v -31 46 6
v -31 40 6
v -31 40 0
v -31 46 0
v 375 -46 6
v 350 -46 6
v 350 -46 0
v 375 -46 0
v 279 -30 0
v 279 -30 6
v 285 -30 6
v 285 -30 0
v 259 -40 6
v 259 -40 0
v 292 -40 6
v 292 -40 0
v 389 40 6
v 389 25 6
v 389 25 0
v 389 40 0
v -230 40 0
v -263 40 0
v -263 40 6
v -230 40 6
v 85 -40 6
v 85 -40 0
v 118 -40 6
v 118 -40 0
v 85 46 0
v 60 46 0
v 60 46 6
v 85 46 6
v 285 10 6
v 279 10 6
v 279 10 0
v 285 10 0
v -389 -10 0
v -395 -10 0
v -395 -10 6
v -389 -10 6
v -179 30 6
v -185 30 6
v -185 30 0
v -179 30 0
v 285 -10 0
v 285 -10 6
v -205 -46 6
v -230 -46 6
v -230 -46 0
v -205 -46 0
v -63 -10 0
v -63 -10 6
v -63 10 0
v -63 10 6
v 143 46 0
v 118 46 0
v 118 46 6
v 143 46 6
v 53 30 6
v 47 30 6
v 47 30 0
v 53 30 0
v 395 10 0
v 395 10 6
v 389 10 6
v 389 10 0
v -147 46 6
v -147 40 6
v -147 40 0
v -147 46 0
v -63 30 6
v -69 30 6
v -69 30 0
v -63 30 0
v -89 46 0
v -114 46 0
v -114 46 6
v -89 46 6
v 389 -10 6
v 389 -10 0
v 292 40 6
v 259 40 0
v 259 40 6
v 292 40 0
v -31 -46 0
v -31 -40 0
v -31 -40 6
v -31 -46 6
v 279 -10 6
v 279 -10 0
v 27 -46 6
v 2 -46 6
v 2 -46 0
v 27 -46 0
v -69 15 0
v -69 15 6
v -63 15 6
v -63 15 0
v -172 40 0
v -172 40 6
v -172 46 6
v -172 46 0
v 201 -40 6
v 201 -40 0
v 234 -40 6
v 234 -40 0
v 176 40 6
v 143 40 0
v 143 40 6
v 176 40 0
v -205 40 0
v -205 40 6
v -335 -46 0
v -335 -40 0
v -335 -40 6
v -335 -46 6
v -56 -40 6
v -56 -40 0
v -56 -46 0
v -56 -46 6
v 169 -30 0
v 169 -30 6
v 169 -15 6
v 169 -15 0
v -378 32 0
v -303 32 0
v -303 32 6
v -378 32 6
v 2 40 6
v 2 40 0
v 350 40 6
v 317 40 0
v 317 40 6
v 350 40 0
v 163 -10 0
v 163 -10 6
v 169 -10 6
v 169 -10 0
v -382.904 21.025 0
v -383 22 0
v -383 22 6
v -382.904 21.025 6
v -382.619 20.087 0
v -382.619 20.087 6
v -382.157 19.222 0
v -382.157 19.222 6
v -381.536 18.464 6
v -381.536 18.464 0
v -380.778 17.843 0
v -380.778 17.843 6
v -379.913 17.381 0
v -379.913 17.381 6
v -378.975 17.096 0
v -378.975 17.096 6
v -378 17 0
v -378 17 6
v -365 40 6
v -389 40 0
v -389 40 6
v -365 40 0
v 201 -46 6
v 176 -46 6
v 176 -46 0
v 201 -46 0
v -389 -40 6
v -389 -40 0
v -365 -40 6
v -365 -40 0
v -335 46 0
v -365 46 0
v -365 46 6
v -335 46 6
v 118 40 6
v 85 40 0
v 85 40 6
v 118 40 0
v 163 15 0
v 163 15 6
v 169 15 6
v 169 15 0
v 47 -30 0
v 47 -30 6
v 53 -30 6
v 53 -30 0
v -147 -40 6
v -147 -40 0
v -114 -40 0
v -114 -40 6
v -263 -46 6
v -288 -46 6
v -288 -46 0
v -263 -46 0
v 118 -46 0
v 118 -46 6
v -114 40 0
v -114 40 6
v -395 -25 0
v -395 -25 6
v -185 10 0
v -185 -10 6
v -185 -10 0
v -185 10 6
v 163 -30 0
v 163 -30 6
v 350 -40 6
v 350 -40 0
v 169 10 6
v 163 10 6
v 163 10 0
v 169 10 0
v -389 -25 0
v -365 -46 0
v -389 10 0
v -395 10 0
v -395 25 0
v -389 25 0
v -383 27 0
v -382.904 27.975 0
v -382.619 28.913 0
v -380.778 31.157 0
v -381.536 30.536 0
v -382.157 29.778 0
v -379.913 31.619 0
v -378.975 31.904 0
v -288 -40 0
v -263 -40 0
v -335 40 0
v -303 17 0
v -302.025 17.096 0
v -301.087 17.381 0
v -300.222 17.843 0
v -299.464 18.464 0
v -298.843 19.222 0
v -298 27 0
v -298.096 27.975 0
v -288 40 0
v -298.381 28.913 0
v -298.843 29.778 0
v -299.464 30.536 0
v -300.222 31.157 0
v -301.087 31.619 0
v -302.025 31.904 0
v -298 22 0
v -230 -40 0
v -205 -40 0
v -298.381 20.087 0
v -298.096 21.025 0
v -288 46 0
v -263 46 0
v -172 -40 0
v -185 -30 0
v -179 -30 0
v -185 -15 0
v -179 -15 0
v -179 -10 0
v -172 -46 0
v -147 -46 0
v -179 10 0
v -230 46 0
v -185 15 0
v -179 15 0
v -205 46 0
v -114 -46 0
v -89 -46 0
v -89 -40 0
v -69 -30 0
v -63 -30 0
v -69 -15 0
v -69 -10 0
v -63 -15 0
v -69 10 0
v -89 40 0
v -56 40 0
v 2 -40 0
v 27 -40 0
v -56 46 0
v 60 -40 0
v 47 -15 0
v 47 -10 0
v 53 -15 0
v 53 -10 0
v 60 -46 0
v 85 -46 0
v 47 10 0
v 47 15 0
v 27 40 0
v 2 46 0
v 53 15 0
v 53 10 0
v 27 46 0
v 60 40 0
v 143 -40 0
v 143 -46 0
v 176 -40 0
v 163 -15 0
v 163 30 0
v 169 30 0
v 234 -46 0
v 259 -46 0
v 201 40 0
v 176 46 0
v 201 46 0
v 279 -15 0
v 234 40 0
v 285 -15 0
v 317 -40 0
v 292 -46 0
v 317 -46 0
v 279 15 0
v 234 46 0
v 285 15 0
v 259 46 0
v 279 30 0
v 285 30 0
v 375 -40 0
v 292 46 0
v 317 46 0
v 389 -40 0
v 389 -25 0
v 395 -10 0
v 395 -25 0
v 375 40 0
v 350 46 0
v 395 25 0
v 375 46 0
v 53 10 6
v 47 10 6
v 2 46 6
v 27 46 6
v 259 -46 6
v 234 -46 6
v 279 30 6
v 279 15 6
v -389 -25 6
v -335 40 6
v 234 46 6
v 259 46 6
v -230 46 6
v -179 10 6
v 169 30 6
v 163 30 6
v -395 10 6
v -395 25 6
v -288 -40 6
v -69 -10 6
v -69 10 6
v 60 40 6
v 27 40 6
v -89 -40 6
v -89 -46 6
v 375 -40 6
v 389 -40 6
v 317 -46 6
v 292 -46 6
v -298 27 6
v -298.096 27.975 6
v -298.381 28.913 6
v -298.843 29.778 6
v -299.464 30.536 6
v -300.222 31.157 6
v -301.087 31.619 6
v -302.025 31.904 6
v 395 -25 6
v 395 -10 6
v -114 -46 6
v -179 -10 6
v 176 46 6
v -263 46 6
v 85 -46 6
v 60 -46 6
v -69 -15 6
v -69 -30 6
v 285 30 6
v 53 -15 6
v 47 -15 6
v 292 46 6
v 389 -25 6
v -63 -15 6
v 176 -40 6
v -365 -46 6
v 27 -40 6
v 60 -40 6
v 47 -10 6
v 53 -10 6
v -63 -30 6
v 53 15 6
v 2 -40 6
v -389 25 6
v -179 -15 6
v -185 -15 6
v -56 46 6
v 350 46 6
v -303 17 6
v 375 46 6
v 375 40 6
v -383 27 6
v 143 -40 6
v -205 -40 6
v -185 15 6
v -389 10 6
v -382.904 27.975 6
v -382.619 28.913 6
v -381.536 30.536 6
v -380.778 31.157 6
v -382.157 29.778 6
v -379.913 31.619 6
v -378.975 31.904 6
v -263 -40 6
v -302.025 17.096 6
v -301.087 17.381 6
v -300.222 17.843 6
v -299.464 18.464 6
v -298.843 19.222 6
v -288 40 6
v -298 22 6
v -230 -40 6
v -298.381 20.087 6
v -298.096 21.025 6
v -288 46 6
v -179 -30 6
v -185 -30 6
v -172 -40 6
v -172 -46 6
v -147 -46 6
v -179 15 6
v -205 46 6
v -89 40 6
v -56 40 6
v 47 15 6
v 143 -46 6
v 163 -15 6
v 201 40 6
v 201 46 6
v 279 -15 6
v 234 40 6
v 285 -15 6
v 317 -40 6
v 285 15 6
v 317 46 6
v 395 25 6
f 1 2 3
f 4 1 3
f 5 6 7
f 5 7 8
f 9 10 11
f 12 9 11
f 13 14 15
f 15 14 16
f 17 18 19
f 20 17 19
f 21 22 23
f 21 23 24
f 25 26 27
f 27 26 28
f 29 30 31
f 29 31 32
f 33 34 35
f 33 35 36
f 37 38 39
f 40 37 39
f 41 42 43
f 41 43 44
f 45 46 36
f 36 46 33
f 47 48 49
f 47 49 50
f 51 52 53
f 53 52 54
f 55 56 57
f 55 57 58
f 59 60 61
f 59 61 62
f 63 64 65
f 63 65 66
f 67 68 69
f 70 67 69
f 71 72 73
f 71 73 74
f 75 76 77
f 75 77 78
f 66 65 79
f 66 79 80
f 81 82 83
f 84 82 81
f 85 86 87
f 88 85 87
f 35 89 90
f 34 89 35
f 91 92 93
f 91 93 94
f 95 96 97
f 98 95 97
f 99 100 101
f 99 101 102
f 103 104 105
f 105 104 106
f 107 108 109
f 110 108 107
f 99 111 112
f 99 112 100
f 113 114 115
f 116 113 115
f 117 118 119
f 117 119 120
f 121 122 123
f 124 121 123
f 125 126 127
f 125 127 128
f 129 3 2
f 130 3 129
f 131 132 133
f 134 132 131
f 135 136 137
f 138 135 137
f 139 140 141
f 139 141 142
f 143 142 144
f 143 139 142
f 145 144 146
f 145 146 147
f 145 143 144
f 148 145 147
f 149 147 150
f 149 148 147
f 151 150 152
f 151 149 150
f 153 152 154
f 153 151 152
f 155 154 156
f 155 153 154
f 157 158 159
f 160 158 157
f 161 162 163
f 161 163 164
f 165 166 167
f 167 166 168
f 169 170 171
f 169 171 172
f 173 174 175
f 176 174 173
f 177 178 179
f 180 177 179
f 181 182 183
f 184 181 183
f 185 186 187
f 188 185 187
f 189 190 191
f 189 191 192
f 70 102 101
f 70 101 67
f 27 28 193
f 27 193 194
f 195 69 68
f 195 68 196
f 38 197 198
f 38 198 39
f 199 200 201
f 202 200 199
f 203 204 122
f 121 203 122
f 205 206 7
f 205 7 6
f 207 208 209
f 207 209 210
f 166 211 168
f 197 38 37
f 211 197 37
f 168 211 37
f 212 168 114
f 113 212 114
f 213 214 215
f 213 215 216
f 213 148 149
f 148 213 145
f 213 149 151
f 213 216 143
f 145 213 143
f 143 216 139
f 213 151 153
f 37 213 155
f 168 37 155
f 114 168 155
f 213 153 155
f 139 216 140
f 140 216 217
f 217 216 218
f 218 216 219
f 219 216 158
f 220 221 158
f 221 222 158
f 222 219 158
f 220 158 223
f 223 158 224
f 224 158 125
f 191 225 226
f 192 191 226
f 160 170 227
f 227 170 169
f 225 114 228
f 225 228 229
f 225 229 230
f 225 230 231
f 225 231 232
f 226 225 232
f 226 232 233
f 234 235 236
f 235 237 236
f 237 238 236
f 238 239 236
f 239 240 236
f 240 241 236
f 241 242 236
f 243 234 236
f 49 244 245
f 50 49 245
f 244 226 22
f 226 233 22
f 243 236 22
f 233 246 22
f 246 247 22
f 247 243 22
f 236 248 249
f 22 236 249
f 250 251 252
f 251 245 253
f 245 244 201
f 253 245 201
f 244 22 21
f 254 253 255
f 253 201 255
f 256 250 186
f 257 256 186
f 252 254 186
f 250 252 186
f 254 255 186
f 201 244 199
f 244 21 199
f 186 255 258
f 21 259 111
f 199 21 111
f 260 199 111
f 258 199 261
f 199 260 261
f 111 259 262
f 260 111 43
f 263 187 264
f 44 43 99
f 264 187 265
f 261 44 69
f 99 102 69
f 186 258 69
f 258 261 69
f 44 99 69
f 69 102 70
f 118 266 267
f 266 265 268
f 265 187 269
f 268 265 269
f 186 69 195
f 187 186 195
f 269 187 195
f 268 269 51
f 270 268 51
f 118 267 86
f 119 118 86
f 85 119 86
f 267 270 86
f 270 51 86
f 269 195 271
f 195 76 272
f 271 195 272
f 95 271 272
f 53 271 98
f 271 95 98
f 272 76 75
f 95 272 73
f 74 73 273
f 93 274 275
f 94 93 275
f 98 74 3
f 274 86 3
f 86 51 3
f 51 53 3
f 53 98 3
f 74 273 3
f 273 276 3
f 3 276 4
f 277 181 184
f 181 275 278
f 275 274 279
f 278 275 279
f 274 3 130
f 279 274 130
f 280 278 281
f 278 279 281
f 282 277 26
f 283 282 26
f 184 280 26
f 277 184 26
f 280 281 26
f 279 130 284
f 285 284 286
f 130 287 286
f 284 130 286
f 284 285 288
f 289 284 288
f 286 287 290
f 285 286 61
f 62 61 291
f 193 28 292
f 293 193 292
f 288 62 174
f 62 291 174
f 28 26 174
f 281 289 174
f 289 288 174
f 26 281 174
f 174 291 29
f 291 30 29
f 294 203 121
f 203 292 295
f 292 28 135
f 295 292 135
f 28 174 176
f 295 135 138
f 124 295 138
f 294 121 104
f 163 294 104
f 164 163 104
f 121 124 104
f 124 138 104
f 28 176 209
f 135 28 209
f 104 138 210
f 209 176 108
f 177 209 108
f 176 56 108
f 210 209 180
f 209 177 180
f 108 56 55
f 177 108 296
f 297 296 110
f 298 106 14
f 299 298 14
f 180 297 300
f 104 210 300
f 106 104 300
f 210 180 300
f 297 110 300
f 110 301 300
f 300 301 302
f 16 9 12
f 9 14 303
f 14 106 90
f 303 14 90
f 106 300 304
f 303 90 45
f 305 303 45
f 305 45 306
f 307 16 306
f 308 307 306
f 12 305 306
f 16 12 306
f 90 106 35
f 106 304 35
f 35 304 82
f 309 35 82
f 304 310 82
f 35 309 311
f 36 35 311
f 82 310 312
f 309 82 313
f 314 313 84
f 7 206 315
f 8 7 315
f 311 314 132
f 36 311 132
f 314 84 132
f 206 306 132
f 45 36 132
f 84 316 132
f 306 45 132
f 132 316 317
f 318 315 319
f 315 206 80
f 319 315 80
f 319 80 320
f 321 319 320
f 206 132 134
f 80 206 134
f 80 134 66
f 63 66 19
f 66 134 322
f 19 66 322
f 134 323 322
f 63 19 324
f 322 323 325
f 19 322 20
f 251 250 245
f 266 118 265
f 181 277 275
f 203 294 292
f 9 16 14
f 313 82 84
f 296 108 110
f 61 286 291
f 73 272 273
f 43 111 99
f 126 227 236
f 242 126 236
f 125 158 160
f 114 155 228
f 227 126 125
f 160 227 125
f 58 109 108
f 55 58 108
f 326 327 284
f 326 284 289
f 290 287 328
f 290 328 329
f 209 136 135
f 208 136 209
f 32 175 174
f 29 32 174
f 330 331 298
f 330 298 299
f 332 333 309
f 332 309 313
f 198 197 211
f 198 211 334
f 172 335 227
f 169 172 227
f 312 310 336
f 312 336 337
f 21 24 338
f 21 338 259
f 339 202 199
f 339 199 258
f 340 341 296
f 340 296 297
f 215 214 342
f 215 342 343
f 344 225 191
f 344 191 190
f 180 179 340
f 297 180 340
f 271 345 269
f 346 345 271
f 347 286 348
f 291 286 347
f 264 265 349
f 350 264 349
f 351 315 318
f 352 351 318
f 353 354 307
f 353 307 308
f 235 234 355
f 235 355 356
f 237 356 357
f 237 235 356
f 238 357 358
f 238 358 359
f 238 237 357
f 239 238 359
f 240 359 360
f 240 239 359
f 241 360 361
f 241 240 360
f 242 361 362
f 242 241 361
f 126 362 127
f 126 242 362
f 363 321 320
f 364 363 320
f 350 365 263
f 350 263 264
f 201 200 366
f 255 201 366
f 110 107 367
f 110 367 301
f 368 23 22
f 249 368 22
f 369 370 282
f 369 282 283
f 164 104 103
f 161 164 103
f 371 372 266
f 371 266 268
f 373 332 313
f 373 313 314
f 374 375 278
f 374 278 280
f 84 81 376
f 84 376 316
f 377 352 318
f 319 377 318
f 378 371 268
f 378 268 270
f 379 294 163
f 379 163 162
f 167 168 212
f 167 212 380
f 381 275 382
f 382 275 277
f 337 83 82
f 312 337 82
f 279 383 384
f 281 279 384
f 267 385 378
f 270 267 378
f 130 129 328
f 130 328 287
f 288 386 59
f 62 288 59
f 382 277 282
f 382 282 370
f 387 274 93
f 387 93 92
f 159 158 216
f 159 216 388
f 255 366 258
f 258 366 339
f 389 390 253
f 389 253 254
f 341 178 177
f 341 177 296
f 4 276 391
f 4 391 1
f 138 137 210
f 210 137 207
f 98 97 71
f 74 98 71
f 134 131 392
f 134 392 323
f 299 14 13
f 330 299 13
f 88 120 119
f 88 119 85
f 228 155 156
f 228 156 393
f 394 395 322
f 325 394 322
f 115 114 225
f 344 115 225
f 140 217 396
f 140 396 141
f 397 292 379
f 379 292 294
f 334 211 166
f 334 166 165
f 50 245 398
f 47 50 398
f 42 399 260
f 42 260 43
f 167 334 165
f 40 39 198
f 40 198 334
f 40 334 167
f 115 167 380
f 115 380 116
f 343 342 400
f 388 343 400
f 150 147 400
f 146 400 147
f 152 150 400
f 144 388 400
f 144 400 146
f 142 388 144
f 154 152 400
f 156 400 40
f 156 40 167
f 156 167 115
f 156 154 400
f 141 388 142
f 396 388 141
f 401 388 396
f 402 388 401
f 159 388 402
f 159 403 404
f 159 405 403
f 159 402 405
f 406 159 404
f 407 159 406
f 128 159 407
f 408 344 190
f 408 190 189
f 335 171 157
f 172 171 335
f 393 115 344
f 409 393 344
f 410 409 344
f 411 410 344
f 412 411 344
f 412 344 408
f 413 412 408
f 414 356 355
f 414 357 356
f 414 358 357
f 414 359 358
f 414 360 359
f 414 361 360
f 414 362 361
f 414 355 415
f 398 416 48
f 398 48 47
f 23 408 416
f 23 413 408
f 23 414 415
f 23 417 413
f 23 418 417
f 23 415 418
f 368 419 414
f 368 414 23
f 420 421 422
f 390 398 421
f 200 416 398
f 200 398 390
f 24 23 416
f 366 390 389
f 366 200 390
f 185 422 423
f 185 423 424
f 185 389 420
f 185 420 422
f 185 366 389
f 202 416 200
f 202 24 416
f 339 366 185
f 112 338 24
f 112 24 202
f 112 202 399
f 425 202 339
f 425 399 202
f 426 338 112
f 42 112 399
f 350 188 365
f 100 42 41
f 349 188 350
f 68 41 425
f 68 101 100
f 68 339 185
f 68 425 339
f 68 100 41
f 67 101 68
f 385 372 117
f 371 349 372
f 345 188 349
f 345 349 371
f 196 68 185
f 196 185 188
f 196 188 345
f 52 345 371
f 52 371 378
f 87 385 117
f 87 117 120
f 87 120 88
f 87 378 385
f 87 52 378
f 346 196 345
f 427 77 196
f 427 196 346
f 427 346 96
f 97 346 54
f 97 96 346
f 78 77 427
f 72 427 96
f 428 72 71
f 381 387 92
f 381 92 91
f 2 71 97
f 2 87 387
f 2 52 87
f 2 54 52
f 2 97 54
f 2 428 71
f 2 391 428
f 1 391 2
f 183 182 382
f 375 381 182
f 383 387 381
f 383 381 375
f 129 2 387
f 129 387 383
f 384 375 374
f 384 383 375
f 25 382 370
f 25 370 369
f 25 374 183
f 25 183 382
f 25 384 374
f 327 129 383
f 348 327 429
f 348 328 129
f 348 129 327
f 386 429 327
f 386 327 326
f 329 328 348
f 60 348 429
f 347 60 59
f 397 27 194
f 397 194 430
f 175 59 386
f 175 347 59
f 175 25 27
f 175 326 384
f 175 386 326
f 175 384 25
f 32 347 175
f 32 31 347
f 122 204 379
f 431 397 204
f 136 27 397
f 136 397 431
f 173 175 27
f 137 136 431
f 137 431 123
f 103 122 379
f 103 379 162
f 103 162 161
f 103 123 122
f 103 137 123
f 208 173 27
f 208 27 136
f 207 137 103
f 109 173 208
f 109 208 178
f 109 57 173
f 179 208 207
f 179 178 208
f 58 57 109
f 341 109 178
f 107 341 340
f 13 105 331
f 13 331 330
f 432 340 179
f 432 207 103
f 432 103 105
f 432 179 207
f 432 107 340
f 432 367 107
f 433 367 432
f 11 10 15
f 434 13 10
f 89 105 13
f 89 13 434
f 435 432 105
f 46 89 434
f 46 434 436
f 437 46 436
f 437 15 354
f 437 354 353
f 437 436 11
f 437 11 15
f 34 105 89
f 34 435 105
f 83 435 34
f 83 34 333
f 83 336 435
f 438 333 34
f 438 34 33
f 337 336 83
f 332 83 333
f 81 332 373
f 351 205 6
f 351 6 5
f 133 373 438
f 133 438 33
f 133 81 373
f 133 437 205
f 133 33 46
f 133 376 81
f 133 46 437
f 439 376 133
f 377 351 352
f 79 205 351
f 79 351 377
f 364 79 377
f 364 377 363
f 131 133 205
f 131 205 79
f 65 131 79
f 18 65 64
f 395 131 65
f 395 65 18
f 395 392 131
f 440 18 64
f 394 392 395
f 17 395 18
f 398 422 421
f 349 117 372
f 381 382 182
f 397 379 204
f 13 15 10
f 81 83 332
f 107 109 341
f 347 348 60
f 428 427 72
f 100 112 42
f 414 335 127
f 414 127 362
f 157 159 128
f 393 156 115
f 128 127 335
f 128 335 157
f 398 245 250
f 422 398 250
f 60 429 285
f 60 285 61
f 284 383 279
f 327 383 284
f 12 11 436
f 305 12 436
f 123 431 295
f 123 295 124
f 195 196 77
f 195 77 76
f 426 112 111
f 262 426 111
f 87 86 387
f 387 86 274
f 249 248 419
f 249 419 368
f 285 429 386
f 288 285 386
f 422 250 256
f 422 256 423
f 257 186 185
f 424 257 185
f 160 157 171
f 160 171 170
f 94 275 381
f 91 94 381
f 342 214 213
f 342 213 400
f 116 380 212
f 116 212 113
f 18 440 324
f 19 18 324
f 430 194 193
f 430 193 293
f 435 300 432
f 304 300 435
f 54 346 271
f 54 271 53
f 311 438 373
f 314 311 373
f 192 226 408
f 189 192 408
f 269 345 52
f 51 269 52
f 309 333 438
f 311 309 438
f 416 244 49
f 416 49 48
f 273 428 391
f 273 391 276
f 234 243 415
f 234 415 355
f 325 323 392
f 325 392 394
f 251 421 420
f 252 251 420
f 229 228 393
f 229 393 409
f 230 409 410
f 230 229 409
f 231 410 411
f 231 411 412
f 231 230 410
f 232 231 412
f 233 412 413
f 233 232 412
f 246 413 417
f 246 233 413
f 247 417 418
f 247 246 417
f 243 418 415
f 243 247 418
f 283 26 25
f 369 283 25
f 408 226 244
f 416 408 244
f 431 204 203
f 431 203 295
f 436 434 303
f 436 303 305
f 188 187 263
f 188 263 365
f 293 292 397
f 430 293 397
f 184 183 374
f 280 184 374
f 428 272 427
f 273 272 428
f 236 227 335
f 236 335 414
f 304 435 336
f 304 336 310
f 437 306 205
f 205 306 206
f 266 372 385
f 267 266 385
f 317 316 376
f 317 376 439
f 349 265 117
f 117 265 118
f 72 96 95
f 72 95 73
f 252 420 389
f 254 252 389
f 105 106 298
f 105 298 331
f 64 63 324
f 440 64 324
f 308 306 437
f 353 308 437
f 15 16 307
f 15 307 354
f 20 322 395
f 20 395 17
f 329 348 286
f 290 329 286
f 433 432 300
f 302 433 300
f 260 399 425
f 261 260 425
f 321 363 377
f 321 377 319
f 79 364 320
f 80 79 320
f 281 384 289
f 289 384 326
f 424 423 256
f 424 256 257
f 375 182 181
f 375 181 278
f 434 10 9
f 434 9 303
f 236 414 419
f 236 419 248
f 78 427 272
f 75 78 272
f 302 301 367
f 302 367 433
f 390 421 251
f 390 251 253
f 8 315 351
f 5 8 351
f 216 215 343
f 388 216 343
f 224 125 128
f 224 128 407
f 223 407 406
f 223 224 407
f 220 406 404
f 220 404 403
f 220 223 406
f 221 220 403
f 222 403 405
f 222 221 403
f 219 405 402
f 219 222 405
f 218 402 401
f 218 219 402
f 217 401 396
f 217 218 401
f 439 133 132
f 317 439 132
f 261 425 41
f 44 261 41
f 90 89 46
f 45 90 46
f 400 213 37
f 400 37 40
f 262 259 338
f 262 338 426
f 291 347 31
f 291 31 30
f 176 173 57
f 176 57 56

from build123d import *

# Parameters (mm, degrees)
SKETCH1_W           = 790
SKETCH1_H           = 80
BOSS_EXTRUDE1_DEPTH = 6
SKETCH2_W           = 25
SKETCH2_H           = 6
BOSS_EXTRUDE2_DEPTH = 6
SKETCH3_W           = 25
SKETCH3_H           = 6
SKETCH3_W_2         = 30
BOSS_EXTRUDE3_DEPTH = 6
CUT_EXTRUDE1_DEPTH  = 6
SKETCH5_W           = 6
SKETCH5_H           = 15
SKETCH5_H_2         = 20
CUT_EXTRUDE2_DEPTH  = 6
SKETCH7_W           = 6
SKETCH7_H           = 15
SKETCH7_H_2         = 20
CUT_EXTRUDE3_DEPTH  = 6
SKETCH8_W           = 30
SKETCH8_H           = 6
BOSS_EXTRUDE6_DEPTH = 6
SKETCH9_W           = 6
SKETCH9_H           = 20
SKETCH9_H_2         = 15
CUT_EXTRUDE4_DEPTH  = 6


with BuildPart() as part:
    # Sketch1 → Boss-Extrude1 (new body)
    with BuildSketch(Plane.XY):
        Rectangle(SKETCH1_W, SKETCH1_H)
    extrude(amount=BOSS_EXTRUDE1_DEPTH)

    # Sketch2 → Boss-Extrude2 (add)
    with BuildSketch(Plane(origin=(0, 40, 0), x_dir=(1, 0, 0), z_dir=(0, 1, 0))):
        with Locations((362.5, -3)):
            Rectangle(SKETCH2_W, SKETCH2_H)
        with Locations((304.5, -3)):
            Rectangle(SKETCH2_W, SKETCH2_H)
        with Locations((246.5, -3)):
            Rectangle(SKETCH2_W, SKETCH2_H)
        with Locations((188.5, -3)):
            Rectangle(SKETCH2_W, SKETCH2_H)
        with Locations((130.5, -3)):
            Rectangle(SKETCH2_W, SKETCH2_H)
        with Locations((72.5, -3)):
            Rectangle(SKETCH2_W, SKETCH2_H)
        with Locations((14.5, -3)):
            Rectangle(SKETCH2_W, SKETCH2_H)
        with Locations((-43.5, -3)):
            Rectangle(SKETCH2_W, SKETCH2_H)
        with Locations((-101.5, -3)):
            Rectangle(SKETCH2_W, SKETCH2_H)
        with Locations((-159.5, -3)):
            Rectangle(SKETCH2_W, SKETCH2_H)
        with Locations((-217.5, -3)):
            Rectangle(SKETCH2_W, SKETCH2_H)
        with Locations((-275.5, -3)):
            Rectangle(SKETCH2_W, SKETCH2_H)
    extrude(amount=BOSS_EXTRUDE2_DEPTH)

    # Sketch3 → Boss-Extrude3 (add)
    with BuildSketch(Plane.XZ.offset(40)):
        with Locations((-275.5, 3)):
            Rectangle(SKETCH3_W, SKETCH3_H)
        with Locations((-217.5, 3)):
            Rectangle(SKETCH3_W, SKETCH3_H)
        with Locations((-159.5, 3)):
            Rectangle(SKETCH3_W, SKETCH3_H)
        with Locations((-101.5, 3)):
            Rectangle(SKETCH3_W, SKETCH3_H)
        with Locations((-43.5, 3)):
            Rectangle(SKETCH3_W, SKETCH3_H)
        with Locations((14.5, 3)):
            Rectangle(SKETCH3_W, SKETCH3_H)
        with Locations((72.5, 3)):
            Rectangle(SKETCH3_W, SKETCH3_H)
        with Locations((130.5, 3)):
            Rectangle(SKETCH3_W, SKETCH3_H)
        with Locations((188.5, 3)):
            Rectangle(SKETCH3_W, SKETCH3_H)
        with Locations((246.5, 3)):
            Rectangle(SKETCH3_W, SKETCH3_H)
        with Locations((304.5, 3)):
            Rectangle(SKETCH3_W, SKETCH3_H)
        with Locations((362.5, 3)):
            Rectangle(SKETCH3_W, SKETCH3_H)
        with Locations((-350, 3)):
            Rectangle(SKETCH3_W_2, SKETCH3_H)
    extrude(amount=BOSS_EXTRUDE3_DEPTH)

    # Sketch4 → Cut-Extrude1 (cut)
    with BuildSketch(Plane(origin=(0, 0, 0), x_dir=(-1, 0, 0), z_dir=(0, 0, -1))):
        with BuildLine():
            Line((378, 17), (303, 17))
            ThreePointArc((303, 17), (299.464466094, 18.464466094), (298, 22))
            Line((298, 22), (298, 27))
            ThreePointArc((298, 27), (299.464466094, 30.535533906), (303, 32))
            Line((303, 32), (378, 32))
            ThreePointArc((378, 32), (381.535533906, 30.535533906), (383, 27))
            Line((383, 27), (383, 22))
            ThreePointArc((383, 22), (381.535533906, 18.464466094), (378, 17))
        make_face()
    extrude(amount=-CUT_EXTRUDE1_DEPTH, mode=Mode.SUBTRACT)

    # Sketch5 → Cut-Extrude2 (cut)
    with BuildSketch(Plane.ZY.offset(395)):
        with Locations((3, -32.5)):
            Rectangle(SKETCH5_W, SKETCH5_H)
        with Locations((3, 0)):
            Rectangle(SKETCH5_W, SKETCH5_H_2)
        with Locations((3, 32.5)):
            Rectangle(SKETCH5_W, SKETCH5_H)
    extrude(amount=-CUT_EXTRUDE2_DEPTH, mode=Mode.SUBTRACT)

    # Sketch7 → Cut-Extrude3 (cut)
    with BuildSketch(Plane(origin=(395, 0, 0), x_dir=(0, 0, -1), z_dir=(1, 0, 0))):
        with Locations((-3, 32.5)):
            Rectangle(SKETCH7_W, SKETCH7_H)
        with Locations((-3, 0)):
            Rectangle(SKETCH7_W, SKETCH7_H_2)
        with Locations((-3, -32.5)):
            Rectangle(SKETCH7_W, SKETCH7_H)
    extrude(amount=-CUT_EXTRUDE3_DEPTH, mode=Mode.SUBTRACT)

    # Sketch8 → Boss-Extrude6 (add)
    with BuildSketch(Plane(origin=(0, 40, 0), x_dir=(1, 0, 0), z_dir=(0, 1, 0))):
        with Locations((-350, -3)):
            Rectangle(SKETCH8_W, SKETCH8_H)
    extrude(amount=BOSS_EXTRUDE6_DEPTH)

    # Sketch9 → Cut-Extrude4 (cut)
    with BuildSketch(Plane.XY.offset(6)):
        with Locations((166, 0)):
            Rectangle(SKETCH9_W, SKETCH9_H)
        with Locations((282, 0)):
            Rectangle(SKETCH9_W, SKETCH9_H)
        with Locations((166, -22.5)):
            Rectangle(SKETCH9_W, SKETCH9_H_2)
        with Locations((166, 22.5)):
            Rectangle(SKETCH9_W, SKETCH9_H_2)
        with Locations((50, 0)):
            Rectangle(SKETCH9_W, SKETCH9_H)
        with Locations((50, -22.5)):
            Rectangle(SKETCH9_W, SKETCH9_H_2)
        with Locations((282, -22.5)):
            Rectangle(SKETCH9_W, SKETCH9_H_2)
        with Locations((282, 22.5)):
            Rectangle(SKETCH9_W, SKETCH9_H_2)
        with Locations((50, 22.5)):
            Rectangle(SKETCH9_W, SKETCH9_H_2)
        with Locations((-66, 0)):
            Rectangle(SKETCH9_W, SKETCH9_H)
        with Locations((-66, -22.5)):
            Rectangle(SKETCH9_W, SKETCH9_H_2)
        with Locations((-66, 22.5)):
            Rectangle(SKETCH9_W, SKETCH9_H_2)
        with Locations((-182, 0)):
            Rectangle(SKETCH9_W, SKETCH9_H)
        with Locations((-182, -22.5)):
            Rectangle(SKETCH9_W, SKETCH9_H_2)
        with Locations((-182, 22.5)):
            Rectangle(SKETCH9_W, SKETCH9_H_2)
    extrude(amount=-CUT_EXTRUDE4_DEPTH, mode=Mode.SUBTRACT)


solid = part.part
